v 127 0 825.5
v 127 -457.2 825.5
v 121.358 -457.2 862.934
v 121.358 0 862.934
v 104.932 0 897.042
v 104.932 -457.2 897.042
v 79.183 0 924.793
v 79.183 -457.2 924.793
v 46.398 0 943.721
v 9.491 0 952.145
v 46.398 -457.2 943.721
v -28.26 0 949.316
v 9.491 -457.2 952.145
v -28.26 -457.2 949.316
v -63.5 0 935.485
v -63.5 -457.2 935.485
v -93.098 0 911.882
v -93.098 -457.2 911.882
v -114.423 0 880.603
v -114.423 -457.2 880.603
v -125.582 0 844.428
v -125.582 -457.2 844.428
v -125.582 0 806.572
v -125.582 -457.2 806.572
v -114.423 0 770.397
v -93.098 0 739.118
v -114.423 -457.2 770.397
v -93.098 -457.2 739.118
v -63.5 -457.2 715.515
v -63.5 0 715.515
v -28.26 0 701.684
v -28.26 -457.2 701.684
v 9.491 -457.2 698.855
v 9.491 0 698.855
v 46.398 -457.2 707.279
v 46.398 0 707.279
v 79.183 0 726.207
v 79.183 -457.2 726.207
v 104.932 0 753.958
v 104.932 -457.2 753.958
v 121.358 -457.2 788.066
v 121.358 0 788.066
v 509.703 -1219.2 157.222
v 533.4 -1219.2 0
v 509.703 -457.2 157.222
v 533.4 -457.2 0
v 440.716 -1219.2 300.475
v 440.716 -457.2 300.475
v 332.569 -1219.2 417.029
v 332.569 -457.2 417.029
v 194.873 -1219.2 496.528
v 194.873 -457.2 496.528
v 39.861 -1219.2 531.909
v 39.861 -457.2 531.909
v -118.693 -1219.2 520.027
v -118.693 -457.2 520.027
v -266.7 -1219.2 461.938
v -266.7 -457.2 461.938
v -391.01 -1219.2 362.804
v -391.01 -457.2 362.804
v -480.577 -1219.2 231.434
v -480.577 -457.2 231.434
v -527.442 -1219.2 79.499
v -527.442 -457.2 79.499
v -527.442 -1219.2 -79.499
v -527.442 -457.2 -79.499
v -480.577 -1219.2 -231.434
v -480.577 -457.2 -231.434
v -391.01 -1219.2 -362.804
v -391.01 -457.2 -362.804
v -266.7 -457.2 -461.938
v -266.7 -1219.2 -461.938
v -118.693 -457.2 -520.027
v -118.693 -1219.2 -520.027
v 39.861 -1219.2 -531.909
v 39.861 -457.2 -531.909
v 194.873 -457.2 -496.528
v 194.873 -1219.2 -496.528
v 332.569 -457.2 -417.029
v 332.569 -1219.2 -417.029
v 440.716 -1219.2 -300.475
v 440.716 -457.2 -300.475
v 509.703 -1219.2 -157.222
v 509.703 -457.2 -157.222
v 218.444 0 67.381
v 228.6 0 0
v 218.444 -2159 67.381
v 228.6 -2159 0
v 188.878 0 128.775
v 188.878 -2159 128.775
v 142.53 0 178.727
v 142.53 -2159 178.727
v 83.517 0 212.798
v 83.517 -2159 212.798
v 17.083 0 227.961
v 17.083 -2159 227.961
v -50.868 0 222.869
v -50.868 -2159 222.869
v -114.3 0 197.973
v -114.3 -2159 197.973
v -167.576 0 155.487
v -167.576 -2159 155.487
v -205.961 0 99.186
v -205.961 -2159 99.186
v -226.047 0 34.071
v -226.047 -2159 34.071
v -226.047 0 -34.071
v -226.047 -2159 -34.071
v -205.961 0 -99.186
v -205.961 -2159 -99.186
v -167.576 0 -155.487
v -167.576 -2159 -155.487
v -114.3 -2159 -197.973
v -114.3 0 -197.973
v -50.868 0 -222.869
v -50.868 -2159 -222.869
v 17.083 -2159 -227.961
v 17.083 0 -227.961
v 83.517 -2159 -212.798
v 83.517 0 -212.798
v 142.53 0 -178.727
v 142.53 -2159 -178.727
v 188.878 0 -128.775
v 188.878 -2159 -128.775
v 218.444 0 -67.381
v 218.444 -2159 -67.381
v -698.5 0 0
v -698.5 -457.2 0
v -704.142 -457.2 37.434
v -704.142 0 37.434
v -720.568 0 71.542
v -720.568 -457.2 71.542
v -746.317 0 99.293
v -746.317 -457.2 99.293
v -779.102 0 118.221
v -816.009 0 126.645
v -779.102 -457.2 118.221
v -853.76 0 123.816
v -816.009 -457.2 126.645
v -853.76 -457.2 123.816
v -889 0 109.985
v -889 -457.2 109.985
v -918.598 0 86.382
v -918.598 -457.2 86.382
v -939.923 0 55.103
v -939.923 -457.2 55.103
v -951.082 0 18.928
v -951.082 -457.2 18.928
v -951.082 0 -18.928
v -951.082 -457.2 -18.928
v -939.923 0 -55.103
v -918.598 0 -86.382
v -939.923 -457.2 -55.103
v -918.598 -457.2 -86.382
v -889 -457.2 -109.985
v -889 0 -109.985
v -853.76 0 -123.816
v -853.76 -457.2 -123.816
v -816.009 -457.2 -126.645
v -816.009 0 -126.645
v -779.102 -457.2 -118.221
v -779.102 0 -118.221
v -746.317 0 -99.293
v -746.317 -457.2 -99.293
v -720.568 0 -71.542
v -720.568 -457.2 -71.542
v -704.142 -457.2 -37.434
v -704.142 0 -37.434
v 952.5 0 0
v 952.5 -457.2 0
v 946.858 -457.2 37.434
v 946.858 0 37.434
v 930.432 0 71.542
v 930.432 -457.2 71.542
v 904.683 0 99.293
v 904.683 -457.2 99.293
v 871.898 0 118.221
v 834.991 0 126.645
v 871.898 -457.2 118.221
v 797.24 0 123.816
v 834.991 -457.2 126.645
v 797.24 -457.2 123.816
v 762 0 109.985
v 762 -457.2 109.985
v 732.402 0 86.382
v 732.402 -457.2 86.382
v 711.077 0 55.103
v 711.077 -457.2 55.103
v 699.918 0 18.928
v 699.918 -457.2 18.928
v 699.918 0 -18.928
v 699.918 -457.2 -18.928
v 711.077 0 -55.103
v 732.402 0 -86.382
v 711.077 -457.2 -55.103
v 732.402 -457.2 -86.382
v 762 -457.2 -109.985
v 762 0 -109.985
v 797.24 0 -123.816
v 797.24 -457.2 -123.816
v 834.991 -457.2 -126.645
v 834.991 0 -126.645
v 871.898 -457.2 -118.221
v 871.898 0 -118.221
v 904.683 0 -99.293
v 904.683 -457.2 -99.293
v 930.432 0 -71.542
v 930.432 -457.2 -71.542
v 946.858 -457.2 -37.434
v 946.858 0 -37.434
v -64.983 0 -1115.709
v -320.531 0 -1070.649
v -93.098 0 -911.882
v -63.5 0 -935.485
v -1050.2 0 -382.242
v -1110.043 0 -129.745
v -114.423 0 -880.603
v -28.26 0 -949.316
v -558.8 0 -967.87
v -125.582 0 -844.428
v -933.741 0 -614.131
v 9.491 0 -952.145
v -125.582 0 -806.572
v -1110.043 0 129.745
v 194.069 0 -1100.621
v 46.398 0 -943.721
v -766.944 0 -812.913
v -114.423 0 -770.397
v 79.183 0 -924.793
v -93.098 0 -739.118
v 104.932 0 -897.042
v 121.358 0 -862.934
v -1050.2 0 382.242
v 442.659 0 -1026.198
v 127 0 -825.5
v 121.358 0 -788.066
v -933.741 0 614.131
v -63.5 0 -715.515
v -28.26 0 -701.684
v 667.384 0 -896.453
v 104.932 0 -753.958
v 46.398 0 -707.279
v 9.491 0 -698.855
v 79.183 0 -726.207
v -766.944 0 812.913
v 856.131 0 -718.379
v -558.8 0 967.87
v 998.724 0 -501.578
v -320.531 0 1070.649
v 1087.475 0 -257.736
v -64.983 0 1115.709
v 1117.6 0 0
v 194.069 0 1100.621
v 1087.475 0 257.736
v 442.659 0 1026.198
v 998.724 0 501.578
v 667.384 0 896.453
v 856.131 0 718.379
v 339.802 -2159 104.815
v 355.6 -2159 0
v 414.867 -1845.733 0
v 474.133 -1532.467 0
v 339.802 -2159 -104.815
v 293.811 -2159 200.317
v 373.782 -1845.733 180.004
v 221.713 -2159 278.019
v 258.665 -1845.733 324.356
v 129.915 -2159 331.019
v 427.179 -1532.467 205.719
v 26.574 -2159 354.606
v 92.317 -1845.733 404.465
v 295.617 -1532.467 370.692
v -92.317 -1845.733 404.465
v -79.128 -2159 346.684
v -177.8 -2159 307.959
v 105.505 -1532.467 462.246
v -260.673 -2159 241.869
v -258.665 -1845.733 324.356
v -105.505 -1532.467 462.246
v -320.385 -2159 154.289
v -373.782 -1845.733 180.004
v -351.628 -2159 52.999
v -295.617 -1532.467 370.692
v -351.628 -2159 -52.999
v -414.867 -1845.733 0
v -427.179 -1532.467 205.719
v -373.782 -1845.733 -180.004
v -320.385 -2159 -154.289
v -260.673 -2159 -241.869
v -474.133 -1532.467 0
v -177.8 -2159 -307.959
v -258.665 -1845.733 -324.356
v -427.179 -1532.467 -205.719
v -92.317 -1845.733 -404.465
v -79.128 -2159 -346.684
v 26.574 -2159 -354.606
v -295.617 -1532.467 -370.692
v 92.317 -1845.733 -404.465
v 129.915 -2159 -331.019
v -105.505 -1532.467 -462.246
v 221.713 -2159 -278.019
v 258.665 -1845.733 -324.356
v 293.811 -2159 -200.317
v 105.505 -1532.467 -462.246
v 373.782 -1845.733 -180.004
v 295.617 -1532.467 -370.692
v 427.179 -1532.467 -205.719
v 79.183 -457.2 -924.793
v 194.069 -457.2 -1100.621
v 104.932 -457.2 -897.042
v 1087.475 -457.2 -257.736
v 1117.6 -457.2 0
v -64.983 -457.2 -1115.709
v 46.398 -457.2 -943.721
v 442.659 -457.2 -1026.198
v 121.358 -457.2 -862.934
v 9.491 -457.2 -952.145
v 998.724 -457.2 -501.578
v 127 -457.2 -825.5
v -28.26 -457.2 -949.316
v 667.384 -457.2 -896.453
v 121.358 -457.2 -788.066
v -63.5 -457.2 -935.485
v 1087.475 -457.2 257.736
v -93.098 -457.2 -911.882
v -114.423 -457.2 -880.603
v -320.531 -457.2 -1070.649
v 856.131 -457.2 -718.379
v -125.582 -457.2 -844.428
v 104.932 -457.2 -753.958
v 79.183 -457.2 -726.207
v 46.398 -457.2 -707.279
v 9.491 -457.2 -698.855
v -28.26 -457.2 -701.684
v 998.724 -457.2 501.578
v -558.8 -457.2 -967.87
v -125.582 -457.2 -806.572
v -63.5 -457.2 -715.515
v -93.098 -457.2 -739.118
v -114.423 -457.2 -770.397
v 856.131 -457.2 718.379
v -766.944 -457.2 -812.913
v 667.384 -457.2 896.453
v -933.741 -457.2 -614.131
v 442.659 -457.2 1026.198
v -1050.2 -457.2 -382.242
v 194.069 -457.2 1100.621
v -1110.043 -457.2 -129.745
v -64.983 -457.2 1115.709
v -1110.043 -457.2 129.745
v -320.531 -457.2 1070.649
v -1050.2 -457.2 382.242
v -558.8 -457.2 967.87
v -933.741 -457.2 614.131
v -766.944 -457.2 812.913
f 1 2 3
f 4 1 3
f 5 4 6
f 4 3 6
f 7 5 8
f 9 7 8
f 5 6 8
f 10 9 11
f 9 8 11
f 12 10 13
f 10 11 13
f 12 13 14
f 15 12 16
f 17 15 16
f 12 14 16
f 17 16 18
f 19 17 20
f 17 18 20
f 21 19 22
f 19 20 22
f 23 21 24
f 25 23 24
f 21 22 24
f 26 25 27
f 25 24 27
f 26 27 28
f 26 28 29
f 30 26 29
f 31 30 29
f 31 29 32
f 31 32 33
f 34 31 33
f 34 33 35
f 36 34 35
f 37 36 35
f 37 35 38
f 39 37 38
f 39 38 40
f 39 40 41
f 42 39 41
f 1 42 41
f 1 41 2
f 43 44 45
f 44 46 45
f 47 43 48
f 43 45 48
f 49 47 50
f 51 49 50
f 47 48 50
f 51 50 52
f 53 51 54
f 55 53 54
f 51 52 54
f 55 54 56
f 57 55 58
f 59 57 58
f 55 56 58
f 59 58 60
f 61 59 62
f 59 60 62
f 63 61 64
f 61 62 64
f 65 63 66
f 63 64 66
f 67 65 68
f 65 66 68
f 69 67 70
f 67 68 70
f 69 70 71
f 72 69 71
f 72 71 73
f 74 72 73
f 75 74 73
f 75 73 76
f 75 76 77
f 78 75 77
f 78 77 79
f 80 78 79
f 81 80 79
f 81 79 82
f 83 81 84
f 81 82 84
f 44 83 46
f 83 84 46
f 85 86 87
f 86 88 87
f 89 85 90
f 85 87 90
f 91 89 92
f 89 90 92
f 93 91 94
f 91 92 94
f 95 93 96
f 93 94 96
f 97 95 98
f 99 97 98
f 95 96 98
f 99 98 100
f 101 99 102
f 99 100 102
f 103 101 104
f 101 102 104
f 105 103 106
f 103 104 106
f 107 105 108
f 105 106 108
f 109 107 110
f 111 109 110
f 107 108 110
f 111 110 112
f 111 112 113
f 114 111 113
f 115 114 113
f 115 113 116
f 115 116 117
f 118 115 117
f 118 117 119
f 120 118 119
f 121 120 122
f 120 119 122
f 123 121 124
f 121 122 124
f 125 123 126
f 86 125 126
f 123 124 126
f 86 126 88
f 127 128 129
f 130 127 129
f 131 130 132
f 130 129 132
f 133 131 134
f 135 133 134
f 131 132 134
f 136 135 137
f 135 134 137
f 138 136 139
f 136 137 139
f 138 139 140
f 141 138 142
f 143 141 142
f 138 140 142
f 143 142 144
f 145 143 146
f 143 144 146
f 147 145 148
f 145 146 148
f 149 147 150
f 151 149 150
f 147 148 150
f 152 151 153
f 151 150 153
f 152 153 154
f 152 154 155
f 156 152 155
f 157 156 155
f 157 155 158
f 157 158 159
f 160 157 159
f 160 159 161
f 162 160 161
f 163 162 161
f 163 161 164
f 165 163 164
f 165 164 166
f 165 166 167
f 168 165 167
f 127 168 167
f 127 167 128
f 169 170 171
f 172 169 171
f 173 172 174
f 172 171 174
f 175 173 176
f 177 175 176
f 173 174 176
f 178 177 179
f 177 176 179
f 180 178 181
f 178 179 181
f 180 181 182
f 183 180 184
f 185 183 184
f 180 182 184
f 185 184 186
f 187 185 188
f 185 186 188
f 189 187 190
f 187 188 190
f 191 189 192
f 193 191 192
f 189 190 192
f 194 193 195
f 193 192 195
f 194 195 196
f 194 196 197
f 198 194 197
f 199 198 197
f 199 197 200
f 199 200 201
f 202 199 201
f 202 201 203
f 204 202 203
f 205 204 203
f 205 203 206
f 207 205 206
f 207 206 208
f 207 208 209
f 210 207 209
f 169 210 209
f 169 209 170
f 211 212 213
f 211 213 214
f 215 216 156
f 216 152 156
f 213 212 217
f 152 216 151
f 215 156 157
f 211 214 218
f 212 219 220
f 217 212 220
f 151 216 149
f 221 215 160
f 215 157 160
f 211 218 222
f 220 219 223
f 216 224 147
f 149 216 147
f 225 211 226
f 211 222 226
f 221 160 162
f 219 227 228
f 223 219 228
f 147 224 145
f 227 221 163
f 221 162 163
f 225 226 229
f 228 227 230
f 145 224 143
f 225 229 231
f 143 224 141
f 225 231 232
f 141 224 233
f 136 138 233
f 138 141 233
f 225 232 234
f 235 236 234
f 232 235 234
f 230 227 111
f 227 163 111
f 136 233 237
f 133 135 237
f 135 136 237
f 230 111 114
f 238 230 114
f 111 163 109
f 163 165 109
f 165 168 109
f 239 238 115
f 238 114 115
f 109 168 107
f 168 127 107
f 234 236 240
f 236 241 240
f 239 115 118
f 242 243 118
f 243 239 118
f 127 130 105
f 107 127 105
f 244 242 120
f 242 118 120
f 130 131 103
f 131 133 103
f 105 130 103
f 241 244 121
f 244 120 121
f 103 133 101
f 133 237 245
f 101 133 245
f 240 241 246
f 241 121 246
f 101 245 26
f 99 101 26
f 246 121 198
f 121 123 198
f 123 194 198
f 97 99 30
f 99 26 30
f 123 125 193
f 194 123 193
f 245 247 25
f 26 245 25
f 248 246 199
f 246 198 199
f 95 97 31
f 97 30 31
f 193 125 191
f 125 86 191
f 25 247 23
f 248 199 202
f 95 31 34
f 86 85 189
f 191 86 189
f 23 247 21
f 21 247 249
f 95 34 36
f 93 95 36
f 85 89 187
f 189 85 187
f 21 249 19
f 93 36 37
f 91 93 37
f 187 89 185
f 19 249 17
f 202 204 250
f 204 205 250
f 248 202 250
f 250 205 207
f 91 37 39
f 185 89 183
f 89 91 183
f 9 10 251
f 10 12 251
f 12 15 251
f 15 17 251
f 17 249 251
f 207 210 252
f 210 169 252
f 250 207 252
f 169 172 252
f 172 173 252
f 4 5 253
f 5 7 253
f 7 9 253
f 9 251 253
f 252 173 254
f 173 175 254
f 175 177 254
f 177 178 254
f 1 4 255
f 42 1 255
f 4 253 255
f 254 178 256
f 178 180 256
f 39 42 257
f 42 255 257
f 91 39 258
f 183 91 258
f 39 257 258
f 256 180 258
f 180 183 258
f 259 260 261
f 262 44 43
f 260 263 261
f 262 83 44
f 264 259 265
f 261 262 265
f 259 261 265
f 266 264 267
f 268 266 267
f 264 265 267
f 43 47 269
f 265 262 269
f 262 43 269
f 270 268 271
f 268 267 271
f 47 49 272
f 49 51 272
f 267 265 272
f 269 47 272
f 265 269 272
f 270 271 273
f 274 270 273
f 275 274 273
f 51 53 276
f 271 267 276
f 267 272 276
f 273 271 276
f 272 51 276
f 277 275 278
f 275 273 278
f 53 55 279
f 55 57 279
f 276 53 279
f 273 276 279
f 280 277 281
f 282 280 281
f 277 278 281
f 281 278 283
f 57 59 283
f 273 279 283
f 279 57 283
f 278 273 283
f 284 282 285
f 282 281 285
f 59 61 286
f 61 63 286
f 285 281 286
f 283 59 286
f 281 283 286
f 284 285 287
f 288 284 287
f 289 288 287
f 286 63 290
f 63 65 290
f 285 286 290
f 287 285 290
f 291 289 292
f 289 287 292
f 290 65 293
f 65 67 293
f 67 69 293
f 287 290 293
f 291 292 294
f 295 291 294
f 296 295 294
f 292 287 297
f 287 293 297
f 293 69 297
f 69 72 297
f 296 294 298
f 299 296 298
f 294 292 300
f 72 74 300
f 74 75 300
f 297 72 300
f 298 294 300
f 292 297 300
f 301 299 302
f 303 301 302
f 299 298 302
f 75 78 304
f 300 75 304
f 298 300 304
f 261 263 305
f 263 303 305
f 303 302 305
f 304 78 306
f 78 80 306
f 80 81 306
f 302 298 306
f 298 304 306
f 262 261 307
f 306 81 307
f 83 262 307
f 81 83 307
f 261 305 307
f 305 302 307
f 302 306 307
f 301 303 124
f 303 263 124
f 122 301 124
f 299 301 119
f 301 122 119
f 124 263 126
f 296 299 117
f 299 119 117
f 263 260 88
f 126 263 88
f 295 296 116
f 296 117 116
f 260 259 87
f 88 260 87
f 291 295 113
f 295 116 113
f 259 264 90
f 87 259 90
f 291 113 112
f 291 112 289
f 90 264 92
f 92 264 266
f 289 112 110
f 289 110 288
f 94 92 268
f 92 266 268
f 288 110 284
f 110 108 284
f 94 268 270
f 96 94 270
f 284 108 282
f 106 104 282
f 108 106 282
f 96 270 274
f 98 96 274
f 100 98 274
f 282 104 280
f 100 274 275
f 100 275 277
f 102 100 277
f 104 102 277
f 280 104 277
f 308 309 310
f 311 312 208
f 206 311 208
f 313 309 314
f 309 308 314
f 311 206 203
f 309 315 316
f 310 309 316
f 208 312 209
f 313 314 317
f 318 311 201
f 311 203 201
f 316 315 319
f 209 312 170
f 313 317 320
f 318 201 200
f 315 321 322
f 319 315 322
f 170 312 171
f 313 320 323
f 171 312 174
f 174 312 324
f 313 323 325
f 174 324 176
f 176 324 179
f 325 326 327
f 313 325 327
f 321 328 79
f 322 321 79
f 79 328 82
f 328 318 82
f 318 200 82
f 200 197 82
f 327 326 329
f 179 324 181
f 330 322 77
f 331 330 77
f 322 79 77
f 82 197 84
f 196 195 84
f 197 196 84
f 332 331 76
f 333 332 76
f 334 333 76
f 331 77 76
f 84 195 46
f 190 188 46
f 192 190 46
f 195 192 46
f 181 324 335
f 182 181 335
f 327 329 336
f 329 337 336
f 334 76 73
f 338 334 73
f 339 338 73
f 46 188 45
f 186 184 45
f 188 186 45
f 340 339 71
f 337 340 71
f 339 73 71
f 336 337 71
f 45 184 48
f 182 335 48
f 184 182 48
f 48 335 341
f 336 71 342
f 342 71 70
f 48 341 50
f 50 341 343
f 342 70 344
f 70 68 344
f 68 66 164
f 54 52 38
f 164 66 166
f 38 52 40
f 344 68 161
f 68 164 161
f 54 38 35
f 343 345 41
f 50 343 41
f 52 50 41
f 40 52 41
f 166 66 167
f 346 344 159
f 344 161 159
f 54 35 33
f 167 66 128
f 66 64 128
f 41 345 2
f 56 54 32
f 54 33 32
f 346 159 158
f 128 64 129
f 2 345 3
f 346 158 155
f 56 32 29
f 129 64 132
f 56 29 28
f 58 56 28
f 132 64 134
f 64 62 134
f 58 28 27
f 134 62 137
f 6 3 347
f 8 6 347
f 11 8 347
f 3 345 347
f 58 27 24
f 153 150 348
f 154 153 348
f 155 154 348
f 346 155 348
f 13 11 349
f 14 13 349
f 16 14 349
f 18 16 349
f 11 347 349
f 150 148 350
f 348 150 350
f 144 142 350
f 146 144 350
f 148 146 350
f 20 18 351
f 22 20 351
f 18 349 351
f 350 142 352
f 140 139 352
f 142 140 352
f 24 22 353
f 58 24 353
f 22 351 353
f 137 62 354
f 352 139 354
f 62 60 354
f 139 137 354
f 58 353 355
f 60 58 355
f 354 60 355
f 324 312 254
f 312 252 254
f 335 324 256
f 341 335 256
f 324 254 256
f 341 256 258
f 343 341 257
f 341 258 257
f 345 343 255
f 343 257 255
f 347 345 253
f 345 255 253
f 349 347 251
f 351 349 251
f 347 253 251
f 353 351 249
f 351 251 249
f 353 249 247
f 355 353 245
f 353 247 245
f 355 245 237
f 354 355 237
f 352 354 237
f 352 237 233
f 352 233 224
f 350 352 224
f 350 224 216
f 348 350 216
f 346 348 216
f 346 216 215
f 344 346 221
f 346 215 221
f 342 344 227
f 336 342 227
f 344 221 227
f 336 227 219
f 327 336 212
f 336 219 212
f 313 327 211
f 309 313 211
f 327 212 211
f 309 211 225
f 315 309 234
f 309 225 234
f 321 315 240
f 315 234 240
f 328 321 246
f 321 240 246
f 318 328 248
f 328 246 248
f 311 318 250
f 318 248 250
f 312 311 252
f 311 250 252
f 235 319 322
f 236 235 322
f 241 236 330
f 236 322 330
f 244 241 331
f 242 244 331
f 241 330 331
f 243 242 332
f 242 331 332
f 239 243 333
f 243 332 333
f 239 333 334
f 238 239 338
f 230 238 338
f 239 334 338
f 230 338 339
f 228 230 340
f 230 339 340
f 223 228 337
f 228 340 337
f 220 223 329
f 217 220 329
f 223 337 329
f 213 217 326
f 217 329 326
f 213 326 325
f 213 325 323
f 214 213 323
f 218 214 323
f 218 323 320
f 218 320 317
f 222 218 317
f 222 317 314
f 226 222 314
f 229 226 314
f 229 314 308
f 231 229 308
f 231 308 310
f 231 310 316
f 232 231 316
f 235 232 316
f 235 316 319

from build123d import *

# Parameters (mm, degrees)
F4_D = 254


with BuildPart() as f2:
    # F1 (on face) → F2 (revolve)
    with BuildSketch(Plane.XY):
        Polygon((1117.6, -457.2), (1117.6, 0), (228.6, 0), (228.6, -2159), (355.6, -2159), (533.4, -1219.2), (533.4, -457.2), align=None)
    revolve(axis=Axis((0, -1079.5, 0), (0, -1, 0)))

    # F4 (through all)
    with Locations(Plane(origin=(0, 0, 0), x_dir=(-1, 0, 0), z_dir=(0, 1, 0))):
        with Locations((0, 825.5), (-825.5, 0), (825.5, 0), (0, -825.5)):
            Hole(F4_D / 2)


solid = f2.part
